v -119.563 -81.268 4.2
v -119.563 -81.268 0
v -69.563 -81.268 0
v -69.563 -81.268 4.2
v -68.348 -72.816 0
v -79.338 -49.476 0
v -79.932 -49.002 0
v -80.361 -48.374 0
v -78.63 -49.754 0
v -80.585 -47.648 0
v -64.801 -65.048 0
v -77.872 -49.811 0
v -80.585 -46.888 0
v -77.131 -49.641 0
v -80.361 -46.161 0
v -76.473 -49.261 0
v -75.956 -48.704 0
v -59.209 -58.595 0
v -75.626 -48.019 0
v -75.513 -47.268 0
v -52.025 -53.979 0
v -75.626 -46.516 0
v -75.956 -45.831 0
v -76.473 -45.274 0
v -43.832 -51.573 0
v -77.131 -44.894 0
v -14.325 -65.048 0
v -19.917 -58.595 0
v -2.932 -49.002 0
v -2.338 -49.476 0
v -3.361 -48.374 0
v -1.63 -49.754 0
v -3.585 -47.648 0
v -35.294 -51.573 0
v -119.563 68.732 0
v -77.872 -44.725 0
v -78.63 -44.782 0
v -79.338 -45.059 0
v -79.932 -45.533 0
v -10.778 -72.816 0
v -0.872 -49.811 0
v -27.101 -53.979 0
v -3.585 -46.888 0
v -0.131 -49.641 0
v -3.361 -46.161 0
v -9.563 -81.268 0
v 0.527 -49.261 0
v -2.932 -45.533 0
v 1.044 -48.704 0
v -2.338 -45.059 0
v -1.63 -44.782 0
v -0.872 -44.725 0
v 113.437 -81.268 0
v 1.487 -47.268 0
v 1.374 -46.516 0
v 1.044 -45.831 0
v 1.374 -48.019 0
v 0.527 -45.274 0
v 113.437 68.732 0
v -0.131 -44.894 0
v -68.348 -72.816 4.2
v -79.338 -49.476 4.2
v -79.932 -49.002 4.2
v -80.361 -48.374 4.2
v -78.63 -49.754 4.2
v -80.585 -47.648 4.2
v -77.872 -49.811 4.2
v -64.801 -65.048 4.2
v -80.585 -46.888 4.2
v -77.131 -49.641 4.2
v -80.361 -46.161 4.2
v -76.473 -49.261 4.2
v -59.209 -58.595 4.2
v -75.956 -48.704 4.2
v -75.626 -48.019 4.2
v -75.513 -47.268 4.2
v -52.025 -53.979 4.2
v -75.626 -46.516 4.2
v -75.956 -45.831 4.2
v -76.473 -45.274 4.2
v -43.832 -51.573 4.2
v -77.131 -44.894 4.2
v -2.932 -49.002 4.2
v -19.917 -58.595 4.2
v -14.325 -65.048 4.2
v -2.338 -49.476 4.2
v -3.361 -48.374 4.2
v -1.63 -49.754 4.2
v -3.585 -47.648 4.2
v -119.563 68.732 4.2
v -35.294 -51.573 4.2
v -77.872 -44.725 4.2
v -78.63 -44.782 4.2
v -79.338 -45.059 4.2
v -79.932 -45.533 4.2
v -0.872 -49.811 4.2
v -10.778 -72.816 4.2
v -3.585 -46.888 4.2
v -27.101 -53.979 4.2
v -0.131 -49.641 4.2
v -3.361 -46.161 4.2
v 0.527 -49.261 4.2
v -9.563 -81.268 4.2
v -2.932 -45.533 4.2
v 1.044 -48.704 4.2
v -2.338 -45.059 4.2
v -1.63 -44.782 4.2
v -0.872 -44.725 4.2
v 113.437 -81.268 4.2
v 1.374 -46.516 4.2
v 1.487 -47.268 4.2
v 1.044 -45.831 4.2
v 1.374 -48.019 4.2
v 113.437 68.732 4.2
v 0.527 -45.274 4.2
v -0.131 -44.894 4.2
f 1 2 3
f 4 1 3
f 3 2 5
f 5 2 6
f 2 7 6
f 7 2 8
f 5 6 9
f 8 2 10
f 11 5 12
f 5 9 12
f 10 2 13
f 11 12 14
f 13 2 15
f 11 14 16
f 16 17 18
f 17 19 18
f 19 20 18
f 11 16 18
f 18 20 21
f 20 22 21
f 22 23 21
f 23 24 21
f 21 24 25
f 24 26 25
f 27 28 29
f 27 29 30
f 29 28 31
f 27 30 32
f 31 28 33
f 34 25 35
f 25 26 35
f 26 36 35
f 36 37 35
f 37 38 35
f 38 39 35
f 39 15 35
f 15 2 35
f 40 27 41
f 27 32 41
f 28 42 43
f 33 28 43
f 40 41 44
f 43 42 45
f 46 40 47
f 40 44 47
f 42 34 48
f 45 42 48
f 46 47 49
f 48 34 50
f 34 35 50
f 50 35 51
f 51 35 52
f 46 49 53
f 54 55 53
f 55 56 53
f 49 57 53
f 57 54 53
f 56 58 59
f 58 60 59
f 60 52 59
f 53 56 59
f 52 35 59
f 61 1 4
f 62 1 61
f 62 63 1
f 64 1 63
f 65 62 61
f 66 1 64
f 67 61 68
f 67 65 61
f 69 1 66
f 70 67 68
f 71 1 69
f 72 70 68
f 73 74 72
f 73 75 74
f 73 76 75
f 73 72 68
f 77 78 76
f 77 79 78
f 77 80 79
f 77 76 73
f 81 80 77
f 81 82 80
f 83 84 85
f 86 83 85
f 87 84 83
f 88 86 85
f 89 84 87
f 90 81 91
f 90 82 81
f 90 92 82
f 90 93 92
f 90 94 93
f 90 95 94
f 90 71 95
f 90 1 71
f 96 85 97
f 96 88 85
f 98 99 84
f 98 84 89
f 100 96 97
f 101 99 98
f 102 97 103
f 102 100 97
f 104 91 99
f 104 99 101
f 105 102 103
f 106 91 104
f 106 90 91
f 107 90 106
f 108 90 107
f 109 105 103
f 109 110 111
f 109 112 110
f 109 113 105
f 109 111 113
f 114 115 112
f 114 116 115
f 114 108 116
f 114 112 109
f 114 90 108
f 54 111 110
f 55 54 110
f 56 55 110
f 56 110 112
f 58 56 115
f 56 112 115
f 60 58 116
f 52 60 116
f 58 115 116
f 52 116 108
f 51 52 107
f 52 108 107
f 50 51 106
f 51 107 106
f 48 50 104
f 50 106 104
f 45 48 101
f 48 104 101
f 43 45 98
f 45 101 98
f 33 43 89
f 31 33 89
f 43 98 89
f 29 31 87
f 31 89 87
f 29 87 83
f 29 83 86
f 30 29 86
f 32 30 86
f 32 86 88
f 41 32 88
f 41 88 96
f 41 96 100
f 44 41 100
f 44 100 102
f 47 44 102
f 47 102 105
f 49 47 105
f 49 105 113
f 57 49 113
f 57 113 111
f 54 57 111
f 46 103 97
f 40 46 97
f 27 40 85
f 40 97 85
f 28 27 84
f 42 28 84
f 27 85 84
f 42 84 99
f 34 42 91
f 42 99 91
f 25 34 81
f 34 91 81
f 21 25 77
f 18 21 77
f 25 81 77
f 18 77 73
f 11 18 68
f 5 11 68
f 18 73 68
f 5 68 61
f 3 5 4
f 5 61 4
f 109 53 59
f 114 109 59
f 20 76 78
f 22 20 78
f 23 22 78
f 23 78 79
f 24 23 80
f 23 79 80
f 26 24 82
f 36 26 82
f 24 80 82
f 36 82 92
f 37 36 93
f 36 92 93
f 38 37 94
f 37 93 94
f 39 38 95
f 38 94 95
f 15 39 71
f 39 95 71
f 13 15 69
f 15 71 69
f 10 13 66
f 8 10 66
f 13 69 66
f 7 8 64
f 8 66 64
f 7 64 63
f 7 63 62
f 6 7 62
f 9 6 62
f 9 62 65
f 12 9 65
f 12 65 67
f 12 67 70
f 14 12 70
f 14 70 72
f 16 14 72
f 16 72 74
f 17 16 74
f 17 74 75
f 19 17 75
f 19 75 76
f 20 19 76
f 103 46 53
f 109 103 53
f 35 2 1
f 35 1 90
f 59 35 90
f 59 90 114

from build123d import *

# Parameters (mm, degrees)
ESQUISSE1_W             = 233
ESQUISSE1_H             = 150
BOSS_EXTRU_1_DEPTH      = 4.2
ESQUISSE2_R             = 2.55
ENL_V_MAT_EXTRU_1_DEPTH = 145.628460094


with BuildPart() as part:
    # Esquisse1 → Boss.-Extru.1 (new body)
    with BuildSketch(Plane.XY):
        with Locations((-3.063037439, -6.267653759)):
            Rectangle(ESQUISSE1_W, ESQUISSE1_H)
    extrude(amount=BOSS_EXTRU_1_DEPTH)

    # Esquisse2 → Enlèv. mat.-Extru.1 (cut, through all)
    with BuildSketch(Plane.XY.offset(4.2)):
        with Locations((-78.063037439, -47.267653759)):
            Circle(ESQUISSE2_R)
        with Locations((-1.063037439, -47.267653759)):
            Circle(ESQUISSE2_R)
        with BuildLine():
            Line((-69.563037439, -81.267653759), (-9.563037439, -81.267653759))
            ThreePointArc((-9.563037439, -81.267653759), (-39.563037439, -51.267653759), (-69.563037439, -81.267653759))
        make_face()
    extrude(amount=-ENL_V_MAT_EXTRU_1_DEPTH, mode=Mode.SUBTRACT)


solid = part.part
